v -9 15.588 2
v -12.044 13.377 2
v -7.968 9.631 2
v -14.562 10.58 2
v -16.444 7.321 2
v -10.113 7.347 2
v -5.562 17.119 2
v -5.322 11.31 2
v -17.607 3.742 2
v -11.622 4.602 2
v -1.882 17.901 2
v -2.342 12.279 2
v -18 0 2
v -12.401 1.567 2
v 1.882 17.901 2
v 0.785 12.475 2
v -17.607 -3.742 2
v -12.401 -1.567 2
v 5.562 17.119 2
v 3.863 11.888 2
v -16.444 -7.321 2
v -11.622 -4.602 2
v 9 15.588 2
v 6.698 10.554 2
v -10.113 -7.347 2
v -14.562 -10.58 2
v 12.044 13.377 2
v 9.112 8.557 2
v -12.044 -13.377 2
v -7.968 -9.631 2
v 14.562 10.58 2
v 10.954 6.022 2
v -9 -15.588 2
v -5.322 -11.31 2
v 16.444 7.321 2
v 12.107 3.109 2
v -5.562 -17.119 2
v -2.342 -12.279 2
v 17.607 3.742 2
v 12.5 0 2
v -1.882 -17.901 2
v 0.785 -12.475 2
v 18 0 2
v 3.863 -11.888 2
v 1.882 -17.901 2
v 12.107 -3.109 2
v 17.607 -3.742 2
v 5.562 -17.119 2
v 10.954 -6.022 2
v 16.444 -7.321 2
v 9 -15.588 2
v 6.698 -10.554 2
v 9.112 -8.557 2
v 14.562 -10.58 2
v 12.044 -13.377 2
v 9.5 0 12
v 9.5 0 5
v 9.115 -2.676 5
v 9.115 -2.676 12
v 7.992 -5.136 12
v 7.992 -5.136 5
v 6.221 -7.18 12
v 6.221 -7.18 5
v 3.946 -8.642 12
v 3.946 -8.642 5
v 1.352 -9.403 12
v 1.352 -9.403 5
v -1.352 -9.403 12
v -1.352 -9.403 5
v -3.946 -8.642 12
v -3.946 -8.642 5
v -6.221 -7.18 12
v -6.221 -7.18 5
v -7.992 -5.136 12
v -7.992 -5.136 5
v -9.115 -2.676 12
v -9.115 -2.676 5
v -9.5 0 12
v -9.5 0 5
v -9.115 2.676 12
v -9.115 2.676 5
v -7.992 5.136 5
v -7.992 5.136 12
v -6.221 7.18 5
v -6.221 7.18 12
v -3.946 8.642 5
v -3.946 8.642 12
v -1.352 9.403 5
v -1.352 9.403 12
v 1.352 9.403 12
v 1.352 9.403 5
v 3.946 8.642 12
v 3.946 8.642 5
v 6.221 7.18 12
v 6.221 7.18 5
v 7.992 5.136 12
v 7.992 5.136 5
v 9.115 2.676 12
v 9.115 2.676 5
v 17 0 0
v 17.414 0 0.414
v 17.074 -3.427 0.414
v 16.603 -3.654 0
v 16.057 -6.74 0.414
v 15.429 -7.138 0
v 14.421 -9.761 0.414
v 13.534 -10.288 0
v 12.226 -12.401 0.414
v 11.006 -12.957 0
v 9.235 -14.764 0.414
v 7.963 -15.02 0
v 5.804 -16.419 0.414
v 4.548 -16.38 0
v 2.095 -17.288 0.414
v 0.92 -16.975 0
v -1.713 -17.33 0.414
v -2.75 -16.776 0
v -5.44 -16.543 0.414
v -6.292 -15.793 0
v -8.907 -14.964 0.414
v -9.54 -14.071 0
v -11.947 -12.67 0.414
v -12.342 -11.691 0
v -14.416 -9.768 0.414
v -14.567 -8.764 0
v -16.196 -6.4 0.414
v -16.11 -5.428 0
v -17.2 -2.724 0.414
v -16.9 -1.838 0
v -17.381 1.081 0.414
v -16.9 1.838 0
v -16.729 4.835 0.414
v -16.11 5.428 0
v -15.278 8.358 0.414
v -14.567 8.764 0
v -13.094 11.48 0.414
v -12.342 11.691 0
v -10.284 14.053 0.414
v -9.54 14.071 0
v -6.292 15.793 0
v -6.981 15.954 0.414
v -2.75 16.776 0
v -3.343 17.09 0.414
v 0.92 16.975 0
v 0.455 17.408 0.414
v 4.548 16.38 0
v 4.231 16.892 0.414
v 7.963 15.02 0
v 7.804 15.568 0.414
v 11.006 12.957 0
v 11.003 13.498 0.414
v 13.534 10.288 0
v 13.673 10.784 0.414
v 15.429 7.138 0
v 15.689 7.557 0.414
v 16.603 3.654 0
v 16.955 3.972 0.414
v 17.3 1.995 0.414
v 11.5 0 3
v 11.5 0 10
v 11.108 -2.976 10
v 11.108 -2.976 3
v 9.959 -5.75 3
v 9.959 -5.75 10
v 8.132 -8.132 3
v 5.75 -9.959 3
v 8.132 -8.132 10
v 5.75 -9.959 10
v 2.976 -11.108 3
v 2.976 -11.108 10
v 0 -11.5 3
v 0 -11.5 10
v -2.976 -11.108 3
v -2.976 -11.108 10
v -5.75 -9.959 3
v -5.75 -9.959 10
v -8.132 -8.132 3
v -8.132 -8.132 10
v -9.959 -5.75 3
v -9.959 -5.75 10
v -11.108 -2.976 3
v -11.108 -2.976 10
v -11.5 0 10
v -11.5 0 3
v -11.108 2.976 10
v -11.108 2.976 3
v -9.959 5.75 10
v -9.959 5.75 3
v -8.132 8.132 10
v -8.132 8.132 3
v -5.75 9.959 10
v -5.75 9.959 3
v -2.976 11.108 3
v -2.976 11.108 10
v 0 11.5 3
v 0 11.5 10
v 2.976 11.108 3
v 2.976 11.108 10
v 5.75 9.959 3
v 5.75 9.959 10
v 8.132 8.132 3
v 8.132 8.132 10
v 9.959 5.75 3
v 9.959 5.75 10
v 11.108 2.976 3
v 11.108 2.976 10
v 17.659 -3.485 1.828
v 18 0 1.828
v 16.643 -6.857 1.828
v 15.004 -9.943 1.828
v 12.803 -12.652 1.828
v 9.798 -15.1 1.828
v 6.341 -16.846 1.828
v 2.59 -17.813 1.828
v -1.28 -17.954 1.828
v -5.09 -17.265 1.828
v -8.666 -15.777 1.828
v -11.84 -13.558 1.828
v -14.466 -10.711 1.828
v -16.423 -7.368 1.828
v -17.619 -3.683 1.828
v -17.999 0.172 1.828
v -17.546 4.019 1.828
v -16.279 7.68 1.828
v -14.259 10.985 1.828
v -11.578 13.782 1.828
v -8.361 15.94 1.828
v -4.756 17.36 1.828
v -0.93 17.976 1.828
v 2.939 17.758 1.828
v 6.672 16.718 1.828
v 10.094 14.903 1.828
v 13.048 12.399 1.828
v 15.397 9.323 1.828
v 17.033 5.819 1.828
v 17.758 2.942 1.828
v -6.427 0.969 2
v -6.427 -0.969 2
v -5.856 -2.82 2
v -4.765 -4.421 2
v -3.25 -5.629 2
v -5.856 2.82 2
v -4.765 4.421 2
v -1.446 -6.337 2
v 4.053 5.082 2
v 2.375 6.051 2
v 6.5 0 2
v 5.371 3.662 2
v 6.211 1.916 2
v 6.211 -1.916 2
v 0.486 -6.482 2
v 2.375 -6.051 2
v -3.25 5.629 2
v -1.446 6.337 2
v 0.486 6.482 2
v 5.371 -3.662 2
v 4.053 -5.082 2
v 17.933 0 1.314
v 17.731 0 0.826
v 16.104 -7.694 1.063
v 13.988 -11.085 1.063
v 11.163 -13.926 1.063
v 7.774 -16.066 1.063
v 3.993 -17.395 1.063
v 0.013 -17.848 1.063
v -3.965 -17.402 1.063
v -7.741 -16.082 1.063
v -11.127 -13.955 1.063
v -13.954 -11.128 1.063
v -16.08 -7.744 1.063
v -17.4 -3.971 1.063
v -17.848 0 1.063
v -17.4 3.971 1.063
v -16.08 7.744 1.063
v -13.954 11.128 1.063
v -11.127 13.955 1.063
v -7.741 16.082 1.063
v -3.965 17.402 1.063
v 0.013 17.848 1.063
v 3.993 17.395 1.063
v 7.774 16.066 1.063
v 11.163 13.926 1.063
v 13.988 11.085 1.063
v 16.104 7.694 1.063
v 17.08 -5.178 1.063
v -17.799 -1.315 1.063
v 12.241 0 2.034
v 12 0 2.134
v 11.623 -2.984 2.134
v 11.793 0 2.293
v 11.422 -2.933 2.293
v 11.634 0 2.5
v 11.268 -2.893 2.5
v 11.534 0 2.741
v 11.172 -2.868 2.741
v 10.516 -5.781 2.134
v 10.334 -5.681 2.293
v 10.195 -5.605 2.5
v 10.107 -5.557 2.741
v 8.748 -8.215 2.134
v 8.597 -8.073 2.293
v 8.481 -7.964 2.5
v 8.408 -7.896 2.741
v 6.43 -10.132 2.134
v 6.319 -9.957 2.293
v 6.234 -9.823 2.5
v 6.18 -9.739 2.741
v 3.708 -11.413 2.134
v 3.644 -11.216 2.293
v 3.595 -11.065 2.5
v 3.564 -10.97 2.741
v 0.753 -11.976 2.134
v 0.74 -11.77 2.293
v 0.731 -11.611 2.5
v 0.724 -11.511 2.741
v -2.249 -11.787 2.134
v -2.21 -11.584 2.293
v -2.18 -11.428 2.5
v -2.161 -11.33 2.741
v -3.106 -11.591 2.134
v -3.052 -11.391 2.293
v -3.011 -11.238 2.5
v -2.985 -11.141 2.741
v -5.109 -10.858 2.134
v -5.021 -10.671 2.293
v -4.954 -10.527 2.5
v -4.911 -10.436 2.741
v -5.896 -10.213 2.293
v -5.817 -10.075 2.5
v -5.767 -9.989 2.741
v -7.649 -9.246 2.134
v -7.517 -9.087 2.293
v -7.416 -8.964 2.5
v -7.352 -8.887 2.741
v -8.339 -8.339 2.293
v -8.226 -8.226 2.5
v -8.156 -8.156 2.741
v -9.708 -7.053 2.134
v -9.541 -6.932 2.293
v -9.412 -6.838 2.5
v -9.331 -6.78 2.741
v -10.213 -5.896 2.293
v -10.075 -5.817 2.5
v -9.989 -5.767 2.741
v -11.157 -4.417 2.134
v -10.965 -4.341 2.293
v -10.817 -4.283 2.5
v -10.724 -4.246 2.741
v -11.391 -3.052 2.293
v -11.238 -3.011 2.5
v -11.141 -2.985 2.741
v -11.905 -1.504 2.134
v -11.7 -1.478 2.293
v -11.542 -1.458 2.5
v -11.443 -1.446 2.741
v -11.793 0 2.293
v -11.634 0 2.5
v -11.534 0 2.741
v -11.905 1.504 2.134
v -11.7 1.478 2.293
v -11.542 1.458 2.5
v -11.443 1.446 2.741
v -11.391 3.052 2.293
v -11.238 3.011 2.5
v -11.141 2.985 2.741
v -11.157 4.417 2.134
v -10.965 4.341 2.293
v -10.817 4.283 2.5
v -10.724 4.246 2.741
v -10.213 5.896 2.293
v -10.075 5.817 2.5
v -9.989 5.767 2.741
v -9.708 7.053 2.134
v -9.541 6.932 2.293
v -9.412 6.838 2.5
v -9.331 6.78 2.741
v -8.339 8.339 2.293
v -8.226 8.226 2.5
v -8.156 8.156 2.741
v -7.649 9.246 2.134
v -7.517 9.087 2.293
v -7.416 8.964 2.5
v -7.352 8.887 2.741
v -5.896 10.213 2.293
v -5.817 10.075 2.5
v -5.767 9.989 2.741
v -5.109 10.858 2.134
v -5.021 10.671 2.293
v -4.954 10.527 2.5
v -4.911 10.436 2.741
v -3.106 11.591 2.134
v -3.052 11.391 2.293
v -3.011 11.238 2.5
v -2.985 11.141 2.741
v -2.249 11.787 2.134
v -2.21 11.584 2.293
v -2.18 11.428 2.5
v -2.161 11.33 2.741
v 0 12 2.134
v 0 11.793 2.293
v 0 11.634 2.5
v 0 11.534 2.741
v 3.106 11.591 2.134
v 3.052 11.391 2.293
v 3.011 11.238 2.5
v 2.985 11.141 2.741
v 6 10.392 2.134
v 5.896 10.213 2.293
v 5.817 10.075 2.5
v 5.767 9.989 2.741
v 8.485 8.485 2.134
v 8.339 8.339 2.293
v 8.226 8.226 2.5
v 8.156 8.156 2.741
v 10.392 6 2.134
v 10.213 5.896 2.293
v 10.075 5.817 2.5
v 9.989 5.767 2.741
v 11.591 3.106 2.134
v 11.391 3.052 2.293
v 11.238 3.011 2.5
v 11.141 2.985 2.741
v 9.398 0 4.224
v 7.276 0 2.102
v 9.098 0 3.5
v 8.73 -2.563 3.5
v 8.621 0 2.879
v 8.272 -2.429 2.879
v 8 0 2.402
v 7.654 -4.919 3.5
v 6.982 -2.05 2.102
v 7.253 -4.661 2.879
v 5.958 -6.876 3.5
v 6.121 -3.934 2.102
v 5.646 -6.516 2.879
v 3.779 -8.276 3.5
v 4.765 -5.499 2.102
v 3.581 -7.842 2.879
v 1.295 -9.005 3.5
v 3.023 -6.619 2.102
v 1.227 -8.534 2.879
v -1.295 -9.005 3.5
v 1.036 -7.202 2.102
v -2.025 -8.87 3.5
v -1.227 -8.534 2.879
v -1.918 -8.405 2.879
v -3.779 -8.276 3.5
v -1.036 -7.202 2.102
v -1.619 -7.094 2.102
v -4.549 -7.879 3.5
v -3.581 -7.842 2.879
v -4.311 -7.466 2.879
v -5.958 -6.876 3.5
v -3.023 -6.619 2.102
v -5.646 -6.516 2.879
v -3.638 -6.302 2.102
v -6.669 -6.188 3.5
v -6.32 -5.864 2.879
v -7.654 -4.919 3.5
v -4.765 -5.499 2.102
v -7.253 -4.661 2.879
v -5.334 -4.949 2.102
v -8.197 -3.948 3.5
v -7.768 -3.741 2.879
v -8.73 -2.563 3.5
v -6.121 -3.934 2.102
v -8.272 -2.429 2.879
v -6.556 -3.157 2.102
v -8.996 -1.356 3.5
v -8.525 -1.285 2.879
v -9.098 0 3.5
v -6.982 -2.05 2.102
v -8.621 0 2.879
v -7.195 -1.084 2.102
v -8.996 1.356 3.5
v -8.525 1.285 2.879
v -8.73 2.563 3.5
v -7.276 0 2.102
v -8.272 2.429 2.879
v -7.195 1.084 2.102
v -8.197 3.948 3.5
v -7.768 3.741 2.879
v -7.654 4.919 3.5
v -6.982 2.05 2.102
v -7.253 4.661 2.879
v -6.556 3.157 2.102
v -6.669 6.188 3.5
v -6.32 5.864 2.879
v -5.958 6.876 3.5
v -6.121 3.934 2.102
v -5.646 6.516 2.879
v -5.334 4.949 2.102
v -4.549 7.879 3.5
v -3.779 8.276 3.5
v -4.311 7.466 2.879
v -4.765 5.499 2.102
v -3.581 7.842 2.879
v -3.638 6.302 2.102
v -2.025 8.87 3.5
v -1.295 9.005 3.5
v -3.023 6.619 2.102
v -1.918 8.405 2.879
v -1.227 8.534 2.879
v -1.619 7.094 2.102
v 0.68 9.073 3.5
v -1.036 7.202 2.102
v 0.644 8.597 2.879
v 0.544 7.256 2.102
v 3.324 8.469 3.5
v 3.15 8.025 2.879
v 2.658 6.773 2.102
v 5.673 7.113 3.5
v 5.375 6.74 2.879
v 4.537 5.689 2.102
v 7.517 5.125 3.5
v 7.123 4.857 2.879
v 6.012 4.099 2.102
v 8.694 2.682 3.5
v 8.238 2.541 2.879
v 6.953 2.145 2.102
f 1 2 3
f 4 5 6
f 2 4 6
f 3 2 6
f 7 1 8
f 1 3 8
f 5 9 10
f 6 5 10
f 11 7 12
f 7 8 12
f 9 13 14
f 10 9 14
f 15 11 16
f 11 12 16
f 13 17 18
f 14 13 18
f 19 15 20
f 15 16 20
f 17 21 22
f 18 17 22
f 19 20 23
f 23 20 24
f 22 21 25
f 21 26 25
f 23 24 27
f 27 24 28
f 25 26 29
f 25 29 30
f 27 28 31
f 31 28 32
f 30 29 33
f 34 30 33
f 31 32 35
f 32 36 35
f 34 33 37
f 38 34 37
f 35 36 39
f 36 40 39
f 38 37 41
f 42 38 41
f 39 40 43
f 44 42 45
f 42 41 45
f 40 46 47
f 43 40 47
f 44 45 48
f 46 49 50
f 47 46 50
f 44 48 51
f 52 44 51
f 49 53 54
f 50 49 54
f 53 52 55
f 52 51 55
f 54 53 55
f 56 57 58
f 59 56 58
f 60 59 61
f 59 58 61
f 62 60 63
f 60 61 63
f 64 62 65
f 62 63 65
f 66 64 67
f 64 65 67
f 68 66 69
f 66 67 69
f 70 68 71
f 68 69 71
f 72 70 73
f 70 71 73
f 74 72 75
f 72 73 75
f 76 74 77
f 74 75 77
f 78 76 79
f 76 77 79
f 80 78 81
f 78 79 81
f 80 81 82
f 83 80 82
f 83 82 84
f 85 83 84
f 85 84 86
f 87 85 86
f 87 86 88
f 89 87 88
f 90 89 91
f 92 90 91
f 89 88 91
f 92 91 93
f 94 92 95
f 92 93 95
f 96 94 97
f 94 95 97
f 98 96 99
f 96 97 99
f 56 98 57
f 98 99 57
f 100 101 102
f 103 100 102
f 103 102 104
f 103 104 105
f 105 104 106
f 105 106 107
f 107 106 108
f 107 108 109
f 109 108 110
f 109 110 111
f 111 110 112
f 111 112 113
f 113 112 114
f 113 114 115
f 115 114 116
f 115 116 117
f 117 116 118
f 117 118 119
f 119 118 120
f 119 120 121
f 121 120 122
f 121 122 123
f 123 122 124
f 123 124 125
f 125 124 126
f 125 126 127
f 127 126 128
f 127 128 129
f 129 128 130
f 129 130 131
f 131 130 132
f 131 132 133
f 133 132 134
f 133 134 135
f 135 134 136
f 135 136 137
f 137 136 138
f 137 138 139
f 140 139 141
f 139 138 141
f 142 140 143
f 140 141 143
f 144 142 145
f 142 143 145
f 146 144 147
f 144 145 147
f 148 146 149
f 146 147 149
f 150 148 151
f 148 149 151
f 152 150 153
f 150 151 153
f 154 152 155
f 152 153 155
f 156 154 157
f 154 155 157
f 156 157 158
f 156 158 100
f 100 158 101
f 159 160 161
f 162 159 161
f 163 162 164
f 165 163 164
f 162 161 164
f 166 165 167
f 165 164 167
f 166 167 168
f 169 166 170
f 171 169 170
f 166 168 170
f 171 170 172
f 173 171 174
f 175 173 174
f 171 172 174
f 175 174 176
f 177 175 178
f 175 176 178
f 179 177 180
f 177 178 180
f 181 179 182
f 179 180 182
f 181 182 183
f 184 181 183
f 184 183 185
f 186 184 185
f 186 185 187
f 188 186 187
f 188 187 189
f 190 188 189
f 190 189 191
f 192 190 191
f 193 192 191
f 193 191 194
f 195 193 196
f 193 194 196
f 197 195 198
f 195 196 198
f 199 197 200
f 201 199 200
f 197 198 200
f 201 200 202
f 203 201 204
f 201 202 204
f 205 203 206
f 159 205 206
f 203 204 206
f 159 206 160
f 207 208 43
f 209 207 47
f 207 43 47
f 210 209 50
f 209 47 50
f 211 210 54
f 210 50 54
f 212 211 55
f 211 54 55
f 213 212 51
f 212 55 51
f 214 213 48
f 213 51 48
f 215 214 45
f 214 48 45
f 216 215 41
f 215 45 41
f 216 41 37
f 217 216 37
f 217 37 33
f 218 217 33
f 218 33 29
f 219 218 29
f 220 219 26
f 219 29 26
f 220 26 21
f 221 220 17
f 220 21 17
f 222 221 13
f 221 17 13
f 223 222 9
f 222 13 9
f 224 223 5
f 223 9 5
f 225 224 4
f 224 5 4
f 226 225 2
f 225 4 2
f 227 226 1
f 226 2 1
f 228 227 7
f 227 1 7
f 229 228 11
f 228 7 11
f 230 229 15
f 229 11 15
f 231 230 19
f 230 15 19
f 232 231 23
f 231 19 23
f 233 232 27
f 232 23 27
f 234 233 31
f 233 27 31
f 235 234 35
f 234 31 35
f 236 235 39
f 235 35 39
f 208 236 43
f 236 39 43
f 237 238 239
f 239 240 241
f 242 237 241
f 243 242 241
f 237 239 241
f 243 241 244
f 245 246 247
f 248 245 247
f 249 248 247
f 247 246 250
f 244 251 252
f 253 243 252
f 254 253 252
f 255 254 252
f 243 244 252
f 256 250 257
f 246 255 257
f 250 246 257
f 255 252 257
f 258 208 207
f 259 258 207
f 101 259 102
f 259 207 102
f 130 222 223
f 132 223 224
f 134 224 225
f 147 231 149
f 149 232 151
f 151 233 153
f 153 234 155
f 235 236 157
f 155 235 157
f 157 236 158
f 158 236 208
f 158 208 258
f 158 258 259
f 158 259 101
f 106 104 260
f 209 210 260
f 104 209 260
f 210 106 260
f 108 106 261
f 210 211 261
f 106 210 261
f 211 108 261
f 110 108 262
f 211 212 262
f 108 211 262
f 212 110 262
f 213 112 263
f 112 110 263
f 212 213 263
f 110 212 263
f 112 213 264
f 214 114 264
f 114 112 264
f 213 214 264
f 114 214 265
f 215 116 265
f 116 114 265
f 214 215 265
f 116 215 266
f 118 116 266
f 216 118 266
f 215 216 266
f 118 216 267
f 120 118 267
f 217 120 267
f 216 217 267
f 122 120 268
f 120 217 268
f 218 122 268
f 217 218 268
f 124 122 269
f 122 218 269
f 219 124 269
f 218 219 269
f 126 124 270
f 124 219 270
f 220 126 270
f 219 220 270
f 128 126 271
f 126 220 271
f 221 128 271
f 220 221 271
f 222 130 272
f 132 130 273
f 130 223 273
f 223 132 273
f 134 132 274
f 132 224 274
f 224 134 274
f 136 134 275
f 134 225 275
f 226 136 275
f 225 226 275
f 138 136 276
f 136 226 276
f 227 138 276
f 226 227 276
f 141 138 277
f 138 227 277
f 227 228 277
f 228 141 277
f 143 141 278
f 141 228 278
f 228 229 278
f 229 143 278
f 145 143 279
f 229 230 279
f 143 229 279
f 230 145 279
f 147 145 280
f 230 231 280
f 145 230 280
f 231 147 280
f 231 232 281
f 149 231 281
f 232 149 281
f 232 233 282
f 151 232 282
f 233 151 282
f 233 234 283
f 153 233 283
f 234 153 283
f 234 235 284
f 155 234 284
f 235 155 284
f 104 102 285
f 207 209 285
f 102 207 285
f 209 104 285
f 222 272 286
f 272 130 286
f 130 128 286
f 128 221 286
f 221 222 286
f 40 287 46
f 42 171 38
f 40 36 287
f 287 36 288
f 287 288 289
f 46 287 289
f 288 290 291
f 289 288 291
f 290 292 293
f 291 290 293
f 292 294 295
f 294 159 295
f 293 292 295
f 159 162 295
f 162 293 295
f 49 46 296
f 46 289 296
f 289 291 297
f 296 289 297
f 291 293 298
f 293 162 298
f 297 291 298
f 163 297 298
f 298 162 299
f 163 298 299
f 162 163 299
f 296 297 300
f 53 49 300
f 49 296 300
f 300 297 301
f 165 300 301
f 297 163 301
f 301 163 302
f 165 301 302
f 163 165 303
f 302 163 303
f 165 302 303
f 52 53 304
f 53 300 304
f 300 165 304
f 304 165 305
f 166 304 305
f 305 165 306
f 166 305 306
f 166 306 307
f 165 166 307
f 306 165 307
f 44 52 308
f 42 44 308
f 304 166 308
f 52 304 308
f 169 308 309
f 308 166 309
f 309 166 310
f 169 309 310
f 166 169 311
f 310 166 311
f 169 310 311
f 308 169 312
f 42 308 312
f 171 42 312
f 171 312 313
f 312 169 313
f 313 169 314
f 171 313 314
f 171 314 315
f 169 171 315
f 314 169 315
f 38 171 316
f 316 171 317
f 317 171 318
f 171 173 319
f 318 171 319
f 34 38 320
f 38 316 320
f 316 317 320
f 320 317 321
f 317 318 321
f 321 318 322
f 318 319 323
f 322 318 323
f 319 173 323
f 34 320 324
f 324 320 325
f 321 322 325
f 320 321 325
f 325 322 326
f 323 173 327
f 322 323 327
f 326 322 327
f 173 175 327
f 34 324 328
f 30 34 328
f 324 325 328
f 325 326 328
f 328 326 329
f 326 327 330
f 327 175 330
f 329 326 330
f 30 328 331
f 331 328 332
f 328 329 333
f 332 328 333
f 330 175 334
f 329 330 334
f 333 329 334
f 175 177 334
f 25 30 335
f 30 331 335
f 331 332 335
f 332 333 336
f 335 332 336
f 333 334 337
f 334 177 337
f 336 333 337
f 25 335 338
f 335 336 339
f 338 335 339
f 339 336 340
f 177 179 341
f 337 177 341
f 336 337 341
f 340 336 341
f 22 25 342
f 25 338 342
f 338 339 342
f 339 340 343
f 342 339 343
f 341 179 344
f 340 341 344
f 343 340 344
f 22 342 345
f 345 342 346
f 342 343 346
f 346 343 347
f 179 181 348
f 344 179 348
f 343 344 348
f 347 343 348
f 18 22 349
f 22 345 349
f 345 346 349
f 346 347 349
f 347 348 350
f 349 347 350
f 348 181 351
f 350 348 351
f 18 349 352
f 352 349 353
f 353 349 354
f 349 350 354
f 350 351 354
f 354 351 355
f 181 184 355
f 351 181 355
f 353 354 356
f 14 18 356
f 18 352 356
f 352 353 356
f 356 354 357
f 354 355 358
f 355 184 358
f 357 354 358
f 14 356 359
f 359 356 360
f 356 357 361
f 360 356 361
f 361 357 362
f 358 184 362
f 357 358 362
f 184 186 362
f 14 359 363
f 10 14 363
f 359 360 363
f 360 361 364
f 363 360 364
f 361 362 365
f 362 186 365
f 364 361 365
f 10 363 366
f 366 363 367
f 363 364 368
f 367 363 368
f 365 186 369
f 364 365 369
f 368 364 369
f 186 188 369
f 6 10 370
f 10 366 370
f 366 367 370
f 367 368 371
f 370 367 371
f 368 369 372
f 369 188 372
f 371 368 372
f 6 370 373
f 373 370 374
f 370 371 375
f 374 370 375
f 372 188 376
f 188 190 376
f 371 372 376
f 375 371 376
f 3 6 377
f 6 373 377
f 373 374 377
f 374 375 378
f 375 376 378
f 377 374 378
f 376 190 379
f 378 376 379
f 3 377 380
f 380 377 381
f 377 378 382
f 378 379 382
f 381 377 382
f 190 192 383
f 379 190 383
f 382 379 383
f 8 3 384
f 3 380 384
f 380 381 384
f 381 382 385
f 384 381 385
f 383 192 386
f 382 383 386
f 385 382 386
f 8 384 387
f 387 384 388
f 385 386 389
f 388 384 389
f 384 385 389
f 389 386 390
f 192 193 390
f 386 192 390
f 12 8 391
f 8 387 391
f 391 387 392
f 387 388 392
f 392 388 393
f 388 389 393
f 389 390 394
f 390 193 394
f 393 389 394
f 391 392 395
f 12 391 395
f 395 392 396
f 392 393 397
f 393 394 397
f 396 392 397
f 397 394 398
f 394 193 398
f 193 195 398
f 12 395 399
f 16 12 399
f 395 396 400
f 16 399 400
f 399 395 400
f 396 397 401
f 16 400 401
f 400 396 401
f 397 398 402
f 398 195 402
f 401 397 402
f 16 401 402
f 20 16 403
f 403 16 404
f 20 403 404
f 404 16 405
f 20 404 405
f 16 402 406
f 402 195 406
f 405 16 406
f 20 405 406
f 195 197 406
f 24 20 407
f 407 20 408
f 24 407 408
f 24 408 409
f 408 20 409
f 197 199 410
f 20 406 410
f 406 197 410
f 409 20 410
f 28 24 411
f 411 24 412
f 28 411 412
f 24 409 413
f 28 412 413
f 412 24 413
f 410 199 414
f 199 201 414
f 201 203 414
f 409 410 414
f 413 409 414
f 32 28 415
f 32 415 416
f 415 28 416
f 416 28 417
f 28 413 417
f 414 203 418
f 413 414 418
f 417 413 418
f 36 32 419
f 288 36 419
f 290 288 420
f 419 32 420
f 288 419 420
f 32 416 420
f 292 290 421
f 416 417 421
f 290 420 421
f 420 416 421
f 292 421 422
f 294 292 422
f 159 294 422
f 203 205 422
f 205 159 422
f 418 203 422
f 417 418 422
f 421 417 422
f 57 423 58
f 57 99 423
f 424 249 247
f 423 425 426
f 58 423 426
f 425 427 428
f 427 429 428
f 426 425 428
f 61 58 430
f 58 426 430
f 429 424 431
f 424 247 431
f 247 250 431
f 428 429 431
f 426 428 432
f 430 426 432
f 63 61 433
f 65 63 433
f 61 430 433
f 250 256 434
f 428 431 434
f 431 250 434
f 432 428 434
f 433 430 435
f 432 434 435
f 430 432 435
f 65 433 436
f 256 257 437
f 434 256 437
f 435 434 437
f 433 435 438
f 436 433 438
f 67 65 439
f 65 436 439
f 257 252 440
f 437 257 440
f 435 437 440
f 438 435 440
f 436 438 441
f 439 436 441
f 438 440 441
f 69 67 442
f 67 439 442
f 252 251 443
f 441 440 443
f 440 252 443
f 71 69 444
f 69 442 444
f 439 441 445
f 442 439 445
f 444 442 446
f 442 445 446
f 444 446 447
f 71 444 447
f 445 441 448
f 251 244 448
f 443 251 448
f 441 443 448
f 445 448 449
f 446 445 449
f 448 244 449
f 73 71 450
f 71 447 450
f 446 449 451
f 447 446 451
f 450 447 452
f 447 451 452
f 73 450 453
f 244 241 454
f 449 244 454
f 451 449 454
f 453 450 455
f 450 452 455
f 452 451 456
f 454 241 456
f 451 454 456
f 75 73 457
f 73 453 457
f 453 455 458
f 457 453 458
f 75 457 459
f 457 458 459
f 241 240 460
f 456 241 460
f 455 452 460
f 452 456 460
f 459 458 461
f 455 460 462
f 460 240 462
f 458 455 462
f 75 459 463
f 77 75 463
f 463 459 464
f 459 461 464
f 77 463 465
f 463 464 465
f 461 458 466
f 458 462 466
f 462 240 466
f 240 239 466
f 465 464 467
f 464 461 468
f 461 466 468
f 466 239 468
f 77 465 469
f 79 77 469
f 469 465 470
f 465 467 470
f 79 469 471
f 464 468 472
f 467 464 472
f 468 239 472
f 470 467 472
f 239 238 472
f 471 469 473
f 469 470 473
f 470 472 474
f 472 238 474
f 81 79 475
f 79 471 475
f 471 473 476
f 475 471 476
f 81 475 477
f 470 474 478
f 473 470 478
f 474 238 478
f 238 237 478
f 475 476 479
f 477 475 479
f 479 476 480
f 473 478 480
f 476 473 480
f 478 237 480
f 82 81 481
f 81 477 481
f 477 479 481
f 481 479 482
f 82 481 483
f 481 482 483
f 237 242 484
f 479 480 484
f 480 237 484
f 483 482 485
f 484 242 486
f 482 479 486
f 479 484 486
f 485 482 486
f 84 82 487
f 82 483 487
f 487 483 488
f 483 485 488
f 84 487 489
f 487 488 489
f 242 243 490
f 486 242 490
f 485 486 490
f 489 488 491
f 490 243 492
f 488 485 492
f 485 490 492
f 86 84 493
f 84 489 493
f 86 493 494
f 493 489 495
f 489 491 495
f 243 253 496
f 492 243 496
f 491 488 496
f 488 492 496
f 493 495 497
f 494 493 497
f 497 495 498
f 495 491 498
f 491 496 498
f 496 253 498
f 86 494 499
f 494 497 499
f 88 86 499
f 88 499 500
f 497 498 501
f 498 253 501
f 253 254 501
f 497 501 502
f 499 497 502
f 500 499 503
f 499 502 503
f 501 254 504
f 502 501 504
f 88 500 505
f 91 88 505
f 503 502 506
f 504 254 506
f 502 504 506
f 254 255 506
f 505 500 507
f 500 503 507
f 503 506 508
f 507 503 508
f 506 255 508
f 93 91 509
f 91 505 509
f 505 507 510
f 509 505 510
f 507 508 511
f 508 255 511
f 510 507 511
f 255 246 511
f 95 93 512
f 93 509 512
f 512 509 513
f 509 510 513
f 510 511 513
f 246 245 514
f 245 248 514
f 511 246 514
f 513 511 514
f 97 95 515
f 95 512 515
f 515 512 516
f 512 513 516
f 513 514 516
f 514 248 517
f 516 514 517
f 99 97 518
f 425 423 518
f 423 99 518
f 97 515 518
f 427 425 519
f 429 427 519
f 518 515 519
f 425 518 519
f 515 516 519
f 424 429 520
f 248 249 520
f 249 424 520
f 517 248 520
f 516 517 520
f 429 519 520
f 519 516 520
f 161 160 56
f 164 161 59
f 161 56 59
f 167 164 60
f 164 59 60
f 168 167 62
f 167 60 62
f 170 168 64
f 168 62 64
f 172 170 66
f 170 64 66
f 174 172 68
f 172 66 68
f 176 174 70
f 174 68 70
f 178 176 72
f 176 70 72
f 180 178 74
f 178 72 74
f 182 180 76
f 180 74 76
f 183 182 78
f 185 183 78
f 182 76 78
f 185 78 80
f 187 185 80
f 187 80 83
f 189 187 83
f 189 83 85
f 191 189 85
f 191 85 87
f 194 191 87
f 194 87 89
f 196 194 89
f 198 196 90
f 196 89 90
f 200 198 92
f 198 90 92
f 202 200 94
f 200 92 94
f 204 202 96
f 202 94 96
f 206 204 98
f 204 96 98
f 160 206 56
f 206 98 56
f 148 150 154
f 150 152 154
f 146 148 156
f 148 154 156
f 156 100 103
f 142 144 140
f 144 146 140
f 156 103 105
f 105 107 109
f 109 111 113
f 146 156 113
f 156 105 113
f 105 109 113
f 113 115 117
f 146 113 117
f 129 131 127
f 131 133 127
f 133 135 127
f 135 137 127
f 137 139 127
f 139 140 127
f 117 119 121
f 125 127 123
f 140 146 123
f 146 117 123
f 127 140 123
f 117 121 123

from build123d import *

# Parameters (mm, degrees)
F2_R = 3
F3_R = 2
F4_R = 1


with BuildPart() as f1:
    # F0 (on Front) → F1 (revolve)
    with BuildSketch(Plane.XZ):
        Polygon((0, 2), (0, 0), (17, 0), (18, 1), (18, 2), (11.5, 2), (11.5, 10), (9.5, 12), (9.5, 2), align=None)
    revolve(axis=Axis((0, 0, 1), (0, 0, -1)))

    # F2
    f2_edges = [f1.edges().sort_by_distance(p)[0] for p in [
        (-9.5, 0, 2),
    ]]
    fillet(f2_edges, radius=F2_R)

    # F3
    f3_edges = [f1.edges().sort_by_distance(p)[0] for p in [
        (-18, 0, 1),
    ]]
    fillet(f3_edges, radius=F3_R)

    # F4
    f4_edges = [f1.edges().sort_by_distance(p)[0] for p in [
        (-11.5, 0, 2),
    ]]
    fillet(f4_edges, radius=F4_R)


solid = f1.part
